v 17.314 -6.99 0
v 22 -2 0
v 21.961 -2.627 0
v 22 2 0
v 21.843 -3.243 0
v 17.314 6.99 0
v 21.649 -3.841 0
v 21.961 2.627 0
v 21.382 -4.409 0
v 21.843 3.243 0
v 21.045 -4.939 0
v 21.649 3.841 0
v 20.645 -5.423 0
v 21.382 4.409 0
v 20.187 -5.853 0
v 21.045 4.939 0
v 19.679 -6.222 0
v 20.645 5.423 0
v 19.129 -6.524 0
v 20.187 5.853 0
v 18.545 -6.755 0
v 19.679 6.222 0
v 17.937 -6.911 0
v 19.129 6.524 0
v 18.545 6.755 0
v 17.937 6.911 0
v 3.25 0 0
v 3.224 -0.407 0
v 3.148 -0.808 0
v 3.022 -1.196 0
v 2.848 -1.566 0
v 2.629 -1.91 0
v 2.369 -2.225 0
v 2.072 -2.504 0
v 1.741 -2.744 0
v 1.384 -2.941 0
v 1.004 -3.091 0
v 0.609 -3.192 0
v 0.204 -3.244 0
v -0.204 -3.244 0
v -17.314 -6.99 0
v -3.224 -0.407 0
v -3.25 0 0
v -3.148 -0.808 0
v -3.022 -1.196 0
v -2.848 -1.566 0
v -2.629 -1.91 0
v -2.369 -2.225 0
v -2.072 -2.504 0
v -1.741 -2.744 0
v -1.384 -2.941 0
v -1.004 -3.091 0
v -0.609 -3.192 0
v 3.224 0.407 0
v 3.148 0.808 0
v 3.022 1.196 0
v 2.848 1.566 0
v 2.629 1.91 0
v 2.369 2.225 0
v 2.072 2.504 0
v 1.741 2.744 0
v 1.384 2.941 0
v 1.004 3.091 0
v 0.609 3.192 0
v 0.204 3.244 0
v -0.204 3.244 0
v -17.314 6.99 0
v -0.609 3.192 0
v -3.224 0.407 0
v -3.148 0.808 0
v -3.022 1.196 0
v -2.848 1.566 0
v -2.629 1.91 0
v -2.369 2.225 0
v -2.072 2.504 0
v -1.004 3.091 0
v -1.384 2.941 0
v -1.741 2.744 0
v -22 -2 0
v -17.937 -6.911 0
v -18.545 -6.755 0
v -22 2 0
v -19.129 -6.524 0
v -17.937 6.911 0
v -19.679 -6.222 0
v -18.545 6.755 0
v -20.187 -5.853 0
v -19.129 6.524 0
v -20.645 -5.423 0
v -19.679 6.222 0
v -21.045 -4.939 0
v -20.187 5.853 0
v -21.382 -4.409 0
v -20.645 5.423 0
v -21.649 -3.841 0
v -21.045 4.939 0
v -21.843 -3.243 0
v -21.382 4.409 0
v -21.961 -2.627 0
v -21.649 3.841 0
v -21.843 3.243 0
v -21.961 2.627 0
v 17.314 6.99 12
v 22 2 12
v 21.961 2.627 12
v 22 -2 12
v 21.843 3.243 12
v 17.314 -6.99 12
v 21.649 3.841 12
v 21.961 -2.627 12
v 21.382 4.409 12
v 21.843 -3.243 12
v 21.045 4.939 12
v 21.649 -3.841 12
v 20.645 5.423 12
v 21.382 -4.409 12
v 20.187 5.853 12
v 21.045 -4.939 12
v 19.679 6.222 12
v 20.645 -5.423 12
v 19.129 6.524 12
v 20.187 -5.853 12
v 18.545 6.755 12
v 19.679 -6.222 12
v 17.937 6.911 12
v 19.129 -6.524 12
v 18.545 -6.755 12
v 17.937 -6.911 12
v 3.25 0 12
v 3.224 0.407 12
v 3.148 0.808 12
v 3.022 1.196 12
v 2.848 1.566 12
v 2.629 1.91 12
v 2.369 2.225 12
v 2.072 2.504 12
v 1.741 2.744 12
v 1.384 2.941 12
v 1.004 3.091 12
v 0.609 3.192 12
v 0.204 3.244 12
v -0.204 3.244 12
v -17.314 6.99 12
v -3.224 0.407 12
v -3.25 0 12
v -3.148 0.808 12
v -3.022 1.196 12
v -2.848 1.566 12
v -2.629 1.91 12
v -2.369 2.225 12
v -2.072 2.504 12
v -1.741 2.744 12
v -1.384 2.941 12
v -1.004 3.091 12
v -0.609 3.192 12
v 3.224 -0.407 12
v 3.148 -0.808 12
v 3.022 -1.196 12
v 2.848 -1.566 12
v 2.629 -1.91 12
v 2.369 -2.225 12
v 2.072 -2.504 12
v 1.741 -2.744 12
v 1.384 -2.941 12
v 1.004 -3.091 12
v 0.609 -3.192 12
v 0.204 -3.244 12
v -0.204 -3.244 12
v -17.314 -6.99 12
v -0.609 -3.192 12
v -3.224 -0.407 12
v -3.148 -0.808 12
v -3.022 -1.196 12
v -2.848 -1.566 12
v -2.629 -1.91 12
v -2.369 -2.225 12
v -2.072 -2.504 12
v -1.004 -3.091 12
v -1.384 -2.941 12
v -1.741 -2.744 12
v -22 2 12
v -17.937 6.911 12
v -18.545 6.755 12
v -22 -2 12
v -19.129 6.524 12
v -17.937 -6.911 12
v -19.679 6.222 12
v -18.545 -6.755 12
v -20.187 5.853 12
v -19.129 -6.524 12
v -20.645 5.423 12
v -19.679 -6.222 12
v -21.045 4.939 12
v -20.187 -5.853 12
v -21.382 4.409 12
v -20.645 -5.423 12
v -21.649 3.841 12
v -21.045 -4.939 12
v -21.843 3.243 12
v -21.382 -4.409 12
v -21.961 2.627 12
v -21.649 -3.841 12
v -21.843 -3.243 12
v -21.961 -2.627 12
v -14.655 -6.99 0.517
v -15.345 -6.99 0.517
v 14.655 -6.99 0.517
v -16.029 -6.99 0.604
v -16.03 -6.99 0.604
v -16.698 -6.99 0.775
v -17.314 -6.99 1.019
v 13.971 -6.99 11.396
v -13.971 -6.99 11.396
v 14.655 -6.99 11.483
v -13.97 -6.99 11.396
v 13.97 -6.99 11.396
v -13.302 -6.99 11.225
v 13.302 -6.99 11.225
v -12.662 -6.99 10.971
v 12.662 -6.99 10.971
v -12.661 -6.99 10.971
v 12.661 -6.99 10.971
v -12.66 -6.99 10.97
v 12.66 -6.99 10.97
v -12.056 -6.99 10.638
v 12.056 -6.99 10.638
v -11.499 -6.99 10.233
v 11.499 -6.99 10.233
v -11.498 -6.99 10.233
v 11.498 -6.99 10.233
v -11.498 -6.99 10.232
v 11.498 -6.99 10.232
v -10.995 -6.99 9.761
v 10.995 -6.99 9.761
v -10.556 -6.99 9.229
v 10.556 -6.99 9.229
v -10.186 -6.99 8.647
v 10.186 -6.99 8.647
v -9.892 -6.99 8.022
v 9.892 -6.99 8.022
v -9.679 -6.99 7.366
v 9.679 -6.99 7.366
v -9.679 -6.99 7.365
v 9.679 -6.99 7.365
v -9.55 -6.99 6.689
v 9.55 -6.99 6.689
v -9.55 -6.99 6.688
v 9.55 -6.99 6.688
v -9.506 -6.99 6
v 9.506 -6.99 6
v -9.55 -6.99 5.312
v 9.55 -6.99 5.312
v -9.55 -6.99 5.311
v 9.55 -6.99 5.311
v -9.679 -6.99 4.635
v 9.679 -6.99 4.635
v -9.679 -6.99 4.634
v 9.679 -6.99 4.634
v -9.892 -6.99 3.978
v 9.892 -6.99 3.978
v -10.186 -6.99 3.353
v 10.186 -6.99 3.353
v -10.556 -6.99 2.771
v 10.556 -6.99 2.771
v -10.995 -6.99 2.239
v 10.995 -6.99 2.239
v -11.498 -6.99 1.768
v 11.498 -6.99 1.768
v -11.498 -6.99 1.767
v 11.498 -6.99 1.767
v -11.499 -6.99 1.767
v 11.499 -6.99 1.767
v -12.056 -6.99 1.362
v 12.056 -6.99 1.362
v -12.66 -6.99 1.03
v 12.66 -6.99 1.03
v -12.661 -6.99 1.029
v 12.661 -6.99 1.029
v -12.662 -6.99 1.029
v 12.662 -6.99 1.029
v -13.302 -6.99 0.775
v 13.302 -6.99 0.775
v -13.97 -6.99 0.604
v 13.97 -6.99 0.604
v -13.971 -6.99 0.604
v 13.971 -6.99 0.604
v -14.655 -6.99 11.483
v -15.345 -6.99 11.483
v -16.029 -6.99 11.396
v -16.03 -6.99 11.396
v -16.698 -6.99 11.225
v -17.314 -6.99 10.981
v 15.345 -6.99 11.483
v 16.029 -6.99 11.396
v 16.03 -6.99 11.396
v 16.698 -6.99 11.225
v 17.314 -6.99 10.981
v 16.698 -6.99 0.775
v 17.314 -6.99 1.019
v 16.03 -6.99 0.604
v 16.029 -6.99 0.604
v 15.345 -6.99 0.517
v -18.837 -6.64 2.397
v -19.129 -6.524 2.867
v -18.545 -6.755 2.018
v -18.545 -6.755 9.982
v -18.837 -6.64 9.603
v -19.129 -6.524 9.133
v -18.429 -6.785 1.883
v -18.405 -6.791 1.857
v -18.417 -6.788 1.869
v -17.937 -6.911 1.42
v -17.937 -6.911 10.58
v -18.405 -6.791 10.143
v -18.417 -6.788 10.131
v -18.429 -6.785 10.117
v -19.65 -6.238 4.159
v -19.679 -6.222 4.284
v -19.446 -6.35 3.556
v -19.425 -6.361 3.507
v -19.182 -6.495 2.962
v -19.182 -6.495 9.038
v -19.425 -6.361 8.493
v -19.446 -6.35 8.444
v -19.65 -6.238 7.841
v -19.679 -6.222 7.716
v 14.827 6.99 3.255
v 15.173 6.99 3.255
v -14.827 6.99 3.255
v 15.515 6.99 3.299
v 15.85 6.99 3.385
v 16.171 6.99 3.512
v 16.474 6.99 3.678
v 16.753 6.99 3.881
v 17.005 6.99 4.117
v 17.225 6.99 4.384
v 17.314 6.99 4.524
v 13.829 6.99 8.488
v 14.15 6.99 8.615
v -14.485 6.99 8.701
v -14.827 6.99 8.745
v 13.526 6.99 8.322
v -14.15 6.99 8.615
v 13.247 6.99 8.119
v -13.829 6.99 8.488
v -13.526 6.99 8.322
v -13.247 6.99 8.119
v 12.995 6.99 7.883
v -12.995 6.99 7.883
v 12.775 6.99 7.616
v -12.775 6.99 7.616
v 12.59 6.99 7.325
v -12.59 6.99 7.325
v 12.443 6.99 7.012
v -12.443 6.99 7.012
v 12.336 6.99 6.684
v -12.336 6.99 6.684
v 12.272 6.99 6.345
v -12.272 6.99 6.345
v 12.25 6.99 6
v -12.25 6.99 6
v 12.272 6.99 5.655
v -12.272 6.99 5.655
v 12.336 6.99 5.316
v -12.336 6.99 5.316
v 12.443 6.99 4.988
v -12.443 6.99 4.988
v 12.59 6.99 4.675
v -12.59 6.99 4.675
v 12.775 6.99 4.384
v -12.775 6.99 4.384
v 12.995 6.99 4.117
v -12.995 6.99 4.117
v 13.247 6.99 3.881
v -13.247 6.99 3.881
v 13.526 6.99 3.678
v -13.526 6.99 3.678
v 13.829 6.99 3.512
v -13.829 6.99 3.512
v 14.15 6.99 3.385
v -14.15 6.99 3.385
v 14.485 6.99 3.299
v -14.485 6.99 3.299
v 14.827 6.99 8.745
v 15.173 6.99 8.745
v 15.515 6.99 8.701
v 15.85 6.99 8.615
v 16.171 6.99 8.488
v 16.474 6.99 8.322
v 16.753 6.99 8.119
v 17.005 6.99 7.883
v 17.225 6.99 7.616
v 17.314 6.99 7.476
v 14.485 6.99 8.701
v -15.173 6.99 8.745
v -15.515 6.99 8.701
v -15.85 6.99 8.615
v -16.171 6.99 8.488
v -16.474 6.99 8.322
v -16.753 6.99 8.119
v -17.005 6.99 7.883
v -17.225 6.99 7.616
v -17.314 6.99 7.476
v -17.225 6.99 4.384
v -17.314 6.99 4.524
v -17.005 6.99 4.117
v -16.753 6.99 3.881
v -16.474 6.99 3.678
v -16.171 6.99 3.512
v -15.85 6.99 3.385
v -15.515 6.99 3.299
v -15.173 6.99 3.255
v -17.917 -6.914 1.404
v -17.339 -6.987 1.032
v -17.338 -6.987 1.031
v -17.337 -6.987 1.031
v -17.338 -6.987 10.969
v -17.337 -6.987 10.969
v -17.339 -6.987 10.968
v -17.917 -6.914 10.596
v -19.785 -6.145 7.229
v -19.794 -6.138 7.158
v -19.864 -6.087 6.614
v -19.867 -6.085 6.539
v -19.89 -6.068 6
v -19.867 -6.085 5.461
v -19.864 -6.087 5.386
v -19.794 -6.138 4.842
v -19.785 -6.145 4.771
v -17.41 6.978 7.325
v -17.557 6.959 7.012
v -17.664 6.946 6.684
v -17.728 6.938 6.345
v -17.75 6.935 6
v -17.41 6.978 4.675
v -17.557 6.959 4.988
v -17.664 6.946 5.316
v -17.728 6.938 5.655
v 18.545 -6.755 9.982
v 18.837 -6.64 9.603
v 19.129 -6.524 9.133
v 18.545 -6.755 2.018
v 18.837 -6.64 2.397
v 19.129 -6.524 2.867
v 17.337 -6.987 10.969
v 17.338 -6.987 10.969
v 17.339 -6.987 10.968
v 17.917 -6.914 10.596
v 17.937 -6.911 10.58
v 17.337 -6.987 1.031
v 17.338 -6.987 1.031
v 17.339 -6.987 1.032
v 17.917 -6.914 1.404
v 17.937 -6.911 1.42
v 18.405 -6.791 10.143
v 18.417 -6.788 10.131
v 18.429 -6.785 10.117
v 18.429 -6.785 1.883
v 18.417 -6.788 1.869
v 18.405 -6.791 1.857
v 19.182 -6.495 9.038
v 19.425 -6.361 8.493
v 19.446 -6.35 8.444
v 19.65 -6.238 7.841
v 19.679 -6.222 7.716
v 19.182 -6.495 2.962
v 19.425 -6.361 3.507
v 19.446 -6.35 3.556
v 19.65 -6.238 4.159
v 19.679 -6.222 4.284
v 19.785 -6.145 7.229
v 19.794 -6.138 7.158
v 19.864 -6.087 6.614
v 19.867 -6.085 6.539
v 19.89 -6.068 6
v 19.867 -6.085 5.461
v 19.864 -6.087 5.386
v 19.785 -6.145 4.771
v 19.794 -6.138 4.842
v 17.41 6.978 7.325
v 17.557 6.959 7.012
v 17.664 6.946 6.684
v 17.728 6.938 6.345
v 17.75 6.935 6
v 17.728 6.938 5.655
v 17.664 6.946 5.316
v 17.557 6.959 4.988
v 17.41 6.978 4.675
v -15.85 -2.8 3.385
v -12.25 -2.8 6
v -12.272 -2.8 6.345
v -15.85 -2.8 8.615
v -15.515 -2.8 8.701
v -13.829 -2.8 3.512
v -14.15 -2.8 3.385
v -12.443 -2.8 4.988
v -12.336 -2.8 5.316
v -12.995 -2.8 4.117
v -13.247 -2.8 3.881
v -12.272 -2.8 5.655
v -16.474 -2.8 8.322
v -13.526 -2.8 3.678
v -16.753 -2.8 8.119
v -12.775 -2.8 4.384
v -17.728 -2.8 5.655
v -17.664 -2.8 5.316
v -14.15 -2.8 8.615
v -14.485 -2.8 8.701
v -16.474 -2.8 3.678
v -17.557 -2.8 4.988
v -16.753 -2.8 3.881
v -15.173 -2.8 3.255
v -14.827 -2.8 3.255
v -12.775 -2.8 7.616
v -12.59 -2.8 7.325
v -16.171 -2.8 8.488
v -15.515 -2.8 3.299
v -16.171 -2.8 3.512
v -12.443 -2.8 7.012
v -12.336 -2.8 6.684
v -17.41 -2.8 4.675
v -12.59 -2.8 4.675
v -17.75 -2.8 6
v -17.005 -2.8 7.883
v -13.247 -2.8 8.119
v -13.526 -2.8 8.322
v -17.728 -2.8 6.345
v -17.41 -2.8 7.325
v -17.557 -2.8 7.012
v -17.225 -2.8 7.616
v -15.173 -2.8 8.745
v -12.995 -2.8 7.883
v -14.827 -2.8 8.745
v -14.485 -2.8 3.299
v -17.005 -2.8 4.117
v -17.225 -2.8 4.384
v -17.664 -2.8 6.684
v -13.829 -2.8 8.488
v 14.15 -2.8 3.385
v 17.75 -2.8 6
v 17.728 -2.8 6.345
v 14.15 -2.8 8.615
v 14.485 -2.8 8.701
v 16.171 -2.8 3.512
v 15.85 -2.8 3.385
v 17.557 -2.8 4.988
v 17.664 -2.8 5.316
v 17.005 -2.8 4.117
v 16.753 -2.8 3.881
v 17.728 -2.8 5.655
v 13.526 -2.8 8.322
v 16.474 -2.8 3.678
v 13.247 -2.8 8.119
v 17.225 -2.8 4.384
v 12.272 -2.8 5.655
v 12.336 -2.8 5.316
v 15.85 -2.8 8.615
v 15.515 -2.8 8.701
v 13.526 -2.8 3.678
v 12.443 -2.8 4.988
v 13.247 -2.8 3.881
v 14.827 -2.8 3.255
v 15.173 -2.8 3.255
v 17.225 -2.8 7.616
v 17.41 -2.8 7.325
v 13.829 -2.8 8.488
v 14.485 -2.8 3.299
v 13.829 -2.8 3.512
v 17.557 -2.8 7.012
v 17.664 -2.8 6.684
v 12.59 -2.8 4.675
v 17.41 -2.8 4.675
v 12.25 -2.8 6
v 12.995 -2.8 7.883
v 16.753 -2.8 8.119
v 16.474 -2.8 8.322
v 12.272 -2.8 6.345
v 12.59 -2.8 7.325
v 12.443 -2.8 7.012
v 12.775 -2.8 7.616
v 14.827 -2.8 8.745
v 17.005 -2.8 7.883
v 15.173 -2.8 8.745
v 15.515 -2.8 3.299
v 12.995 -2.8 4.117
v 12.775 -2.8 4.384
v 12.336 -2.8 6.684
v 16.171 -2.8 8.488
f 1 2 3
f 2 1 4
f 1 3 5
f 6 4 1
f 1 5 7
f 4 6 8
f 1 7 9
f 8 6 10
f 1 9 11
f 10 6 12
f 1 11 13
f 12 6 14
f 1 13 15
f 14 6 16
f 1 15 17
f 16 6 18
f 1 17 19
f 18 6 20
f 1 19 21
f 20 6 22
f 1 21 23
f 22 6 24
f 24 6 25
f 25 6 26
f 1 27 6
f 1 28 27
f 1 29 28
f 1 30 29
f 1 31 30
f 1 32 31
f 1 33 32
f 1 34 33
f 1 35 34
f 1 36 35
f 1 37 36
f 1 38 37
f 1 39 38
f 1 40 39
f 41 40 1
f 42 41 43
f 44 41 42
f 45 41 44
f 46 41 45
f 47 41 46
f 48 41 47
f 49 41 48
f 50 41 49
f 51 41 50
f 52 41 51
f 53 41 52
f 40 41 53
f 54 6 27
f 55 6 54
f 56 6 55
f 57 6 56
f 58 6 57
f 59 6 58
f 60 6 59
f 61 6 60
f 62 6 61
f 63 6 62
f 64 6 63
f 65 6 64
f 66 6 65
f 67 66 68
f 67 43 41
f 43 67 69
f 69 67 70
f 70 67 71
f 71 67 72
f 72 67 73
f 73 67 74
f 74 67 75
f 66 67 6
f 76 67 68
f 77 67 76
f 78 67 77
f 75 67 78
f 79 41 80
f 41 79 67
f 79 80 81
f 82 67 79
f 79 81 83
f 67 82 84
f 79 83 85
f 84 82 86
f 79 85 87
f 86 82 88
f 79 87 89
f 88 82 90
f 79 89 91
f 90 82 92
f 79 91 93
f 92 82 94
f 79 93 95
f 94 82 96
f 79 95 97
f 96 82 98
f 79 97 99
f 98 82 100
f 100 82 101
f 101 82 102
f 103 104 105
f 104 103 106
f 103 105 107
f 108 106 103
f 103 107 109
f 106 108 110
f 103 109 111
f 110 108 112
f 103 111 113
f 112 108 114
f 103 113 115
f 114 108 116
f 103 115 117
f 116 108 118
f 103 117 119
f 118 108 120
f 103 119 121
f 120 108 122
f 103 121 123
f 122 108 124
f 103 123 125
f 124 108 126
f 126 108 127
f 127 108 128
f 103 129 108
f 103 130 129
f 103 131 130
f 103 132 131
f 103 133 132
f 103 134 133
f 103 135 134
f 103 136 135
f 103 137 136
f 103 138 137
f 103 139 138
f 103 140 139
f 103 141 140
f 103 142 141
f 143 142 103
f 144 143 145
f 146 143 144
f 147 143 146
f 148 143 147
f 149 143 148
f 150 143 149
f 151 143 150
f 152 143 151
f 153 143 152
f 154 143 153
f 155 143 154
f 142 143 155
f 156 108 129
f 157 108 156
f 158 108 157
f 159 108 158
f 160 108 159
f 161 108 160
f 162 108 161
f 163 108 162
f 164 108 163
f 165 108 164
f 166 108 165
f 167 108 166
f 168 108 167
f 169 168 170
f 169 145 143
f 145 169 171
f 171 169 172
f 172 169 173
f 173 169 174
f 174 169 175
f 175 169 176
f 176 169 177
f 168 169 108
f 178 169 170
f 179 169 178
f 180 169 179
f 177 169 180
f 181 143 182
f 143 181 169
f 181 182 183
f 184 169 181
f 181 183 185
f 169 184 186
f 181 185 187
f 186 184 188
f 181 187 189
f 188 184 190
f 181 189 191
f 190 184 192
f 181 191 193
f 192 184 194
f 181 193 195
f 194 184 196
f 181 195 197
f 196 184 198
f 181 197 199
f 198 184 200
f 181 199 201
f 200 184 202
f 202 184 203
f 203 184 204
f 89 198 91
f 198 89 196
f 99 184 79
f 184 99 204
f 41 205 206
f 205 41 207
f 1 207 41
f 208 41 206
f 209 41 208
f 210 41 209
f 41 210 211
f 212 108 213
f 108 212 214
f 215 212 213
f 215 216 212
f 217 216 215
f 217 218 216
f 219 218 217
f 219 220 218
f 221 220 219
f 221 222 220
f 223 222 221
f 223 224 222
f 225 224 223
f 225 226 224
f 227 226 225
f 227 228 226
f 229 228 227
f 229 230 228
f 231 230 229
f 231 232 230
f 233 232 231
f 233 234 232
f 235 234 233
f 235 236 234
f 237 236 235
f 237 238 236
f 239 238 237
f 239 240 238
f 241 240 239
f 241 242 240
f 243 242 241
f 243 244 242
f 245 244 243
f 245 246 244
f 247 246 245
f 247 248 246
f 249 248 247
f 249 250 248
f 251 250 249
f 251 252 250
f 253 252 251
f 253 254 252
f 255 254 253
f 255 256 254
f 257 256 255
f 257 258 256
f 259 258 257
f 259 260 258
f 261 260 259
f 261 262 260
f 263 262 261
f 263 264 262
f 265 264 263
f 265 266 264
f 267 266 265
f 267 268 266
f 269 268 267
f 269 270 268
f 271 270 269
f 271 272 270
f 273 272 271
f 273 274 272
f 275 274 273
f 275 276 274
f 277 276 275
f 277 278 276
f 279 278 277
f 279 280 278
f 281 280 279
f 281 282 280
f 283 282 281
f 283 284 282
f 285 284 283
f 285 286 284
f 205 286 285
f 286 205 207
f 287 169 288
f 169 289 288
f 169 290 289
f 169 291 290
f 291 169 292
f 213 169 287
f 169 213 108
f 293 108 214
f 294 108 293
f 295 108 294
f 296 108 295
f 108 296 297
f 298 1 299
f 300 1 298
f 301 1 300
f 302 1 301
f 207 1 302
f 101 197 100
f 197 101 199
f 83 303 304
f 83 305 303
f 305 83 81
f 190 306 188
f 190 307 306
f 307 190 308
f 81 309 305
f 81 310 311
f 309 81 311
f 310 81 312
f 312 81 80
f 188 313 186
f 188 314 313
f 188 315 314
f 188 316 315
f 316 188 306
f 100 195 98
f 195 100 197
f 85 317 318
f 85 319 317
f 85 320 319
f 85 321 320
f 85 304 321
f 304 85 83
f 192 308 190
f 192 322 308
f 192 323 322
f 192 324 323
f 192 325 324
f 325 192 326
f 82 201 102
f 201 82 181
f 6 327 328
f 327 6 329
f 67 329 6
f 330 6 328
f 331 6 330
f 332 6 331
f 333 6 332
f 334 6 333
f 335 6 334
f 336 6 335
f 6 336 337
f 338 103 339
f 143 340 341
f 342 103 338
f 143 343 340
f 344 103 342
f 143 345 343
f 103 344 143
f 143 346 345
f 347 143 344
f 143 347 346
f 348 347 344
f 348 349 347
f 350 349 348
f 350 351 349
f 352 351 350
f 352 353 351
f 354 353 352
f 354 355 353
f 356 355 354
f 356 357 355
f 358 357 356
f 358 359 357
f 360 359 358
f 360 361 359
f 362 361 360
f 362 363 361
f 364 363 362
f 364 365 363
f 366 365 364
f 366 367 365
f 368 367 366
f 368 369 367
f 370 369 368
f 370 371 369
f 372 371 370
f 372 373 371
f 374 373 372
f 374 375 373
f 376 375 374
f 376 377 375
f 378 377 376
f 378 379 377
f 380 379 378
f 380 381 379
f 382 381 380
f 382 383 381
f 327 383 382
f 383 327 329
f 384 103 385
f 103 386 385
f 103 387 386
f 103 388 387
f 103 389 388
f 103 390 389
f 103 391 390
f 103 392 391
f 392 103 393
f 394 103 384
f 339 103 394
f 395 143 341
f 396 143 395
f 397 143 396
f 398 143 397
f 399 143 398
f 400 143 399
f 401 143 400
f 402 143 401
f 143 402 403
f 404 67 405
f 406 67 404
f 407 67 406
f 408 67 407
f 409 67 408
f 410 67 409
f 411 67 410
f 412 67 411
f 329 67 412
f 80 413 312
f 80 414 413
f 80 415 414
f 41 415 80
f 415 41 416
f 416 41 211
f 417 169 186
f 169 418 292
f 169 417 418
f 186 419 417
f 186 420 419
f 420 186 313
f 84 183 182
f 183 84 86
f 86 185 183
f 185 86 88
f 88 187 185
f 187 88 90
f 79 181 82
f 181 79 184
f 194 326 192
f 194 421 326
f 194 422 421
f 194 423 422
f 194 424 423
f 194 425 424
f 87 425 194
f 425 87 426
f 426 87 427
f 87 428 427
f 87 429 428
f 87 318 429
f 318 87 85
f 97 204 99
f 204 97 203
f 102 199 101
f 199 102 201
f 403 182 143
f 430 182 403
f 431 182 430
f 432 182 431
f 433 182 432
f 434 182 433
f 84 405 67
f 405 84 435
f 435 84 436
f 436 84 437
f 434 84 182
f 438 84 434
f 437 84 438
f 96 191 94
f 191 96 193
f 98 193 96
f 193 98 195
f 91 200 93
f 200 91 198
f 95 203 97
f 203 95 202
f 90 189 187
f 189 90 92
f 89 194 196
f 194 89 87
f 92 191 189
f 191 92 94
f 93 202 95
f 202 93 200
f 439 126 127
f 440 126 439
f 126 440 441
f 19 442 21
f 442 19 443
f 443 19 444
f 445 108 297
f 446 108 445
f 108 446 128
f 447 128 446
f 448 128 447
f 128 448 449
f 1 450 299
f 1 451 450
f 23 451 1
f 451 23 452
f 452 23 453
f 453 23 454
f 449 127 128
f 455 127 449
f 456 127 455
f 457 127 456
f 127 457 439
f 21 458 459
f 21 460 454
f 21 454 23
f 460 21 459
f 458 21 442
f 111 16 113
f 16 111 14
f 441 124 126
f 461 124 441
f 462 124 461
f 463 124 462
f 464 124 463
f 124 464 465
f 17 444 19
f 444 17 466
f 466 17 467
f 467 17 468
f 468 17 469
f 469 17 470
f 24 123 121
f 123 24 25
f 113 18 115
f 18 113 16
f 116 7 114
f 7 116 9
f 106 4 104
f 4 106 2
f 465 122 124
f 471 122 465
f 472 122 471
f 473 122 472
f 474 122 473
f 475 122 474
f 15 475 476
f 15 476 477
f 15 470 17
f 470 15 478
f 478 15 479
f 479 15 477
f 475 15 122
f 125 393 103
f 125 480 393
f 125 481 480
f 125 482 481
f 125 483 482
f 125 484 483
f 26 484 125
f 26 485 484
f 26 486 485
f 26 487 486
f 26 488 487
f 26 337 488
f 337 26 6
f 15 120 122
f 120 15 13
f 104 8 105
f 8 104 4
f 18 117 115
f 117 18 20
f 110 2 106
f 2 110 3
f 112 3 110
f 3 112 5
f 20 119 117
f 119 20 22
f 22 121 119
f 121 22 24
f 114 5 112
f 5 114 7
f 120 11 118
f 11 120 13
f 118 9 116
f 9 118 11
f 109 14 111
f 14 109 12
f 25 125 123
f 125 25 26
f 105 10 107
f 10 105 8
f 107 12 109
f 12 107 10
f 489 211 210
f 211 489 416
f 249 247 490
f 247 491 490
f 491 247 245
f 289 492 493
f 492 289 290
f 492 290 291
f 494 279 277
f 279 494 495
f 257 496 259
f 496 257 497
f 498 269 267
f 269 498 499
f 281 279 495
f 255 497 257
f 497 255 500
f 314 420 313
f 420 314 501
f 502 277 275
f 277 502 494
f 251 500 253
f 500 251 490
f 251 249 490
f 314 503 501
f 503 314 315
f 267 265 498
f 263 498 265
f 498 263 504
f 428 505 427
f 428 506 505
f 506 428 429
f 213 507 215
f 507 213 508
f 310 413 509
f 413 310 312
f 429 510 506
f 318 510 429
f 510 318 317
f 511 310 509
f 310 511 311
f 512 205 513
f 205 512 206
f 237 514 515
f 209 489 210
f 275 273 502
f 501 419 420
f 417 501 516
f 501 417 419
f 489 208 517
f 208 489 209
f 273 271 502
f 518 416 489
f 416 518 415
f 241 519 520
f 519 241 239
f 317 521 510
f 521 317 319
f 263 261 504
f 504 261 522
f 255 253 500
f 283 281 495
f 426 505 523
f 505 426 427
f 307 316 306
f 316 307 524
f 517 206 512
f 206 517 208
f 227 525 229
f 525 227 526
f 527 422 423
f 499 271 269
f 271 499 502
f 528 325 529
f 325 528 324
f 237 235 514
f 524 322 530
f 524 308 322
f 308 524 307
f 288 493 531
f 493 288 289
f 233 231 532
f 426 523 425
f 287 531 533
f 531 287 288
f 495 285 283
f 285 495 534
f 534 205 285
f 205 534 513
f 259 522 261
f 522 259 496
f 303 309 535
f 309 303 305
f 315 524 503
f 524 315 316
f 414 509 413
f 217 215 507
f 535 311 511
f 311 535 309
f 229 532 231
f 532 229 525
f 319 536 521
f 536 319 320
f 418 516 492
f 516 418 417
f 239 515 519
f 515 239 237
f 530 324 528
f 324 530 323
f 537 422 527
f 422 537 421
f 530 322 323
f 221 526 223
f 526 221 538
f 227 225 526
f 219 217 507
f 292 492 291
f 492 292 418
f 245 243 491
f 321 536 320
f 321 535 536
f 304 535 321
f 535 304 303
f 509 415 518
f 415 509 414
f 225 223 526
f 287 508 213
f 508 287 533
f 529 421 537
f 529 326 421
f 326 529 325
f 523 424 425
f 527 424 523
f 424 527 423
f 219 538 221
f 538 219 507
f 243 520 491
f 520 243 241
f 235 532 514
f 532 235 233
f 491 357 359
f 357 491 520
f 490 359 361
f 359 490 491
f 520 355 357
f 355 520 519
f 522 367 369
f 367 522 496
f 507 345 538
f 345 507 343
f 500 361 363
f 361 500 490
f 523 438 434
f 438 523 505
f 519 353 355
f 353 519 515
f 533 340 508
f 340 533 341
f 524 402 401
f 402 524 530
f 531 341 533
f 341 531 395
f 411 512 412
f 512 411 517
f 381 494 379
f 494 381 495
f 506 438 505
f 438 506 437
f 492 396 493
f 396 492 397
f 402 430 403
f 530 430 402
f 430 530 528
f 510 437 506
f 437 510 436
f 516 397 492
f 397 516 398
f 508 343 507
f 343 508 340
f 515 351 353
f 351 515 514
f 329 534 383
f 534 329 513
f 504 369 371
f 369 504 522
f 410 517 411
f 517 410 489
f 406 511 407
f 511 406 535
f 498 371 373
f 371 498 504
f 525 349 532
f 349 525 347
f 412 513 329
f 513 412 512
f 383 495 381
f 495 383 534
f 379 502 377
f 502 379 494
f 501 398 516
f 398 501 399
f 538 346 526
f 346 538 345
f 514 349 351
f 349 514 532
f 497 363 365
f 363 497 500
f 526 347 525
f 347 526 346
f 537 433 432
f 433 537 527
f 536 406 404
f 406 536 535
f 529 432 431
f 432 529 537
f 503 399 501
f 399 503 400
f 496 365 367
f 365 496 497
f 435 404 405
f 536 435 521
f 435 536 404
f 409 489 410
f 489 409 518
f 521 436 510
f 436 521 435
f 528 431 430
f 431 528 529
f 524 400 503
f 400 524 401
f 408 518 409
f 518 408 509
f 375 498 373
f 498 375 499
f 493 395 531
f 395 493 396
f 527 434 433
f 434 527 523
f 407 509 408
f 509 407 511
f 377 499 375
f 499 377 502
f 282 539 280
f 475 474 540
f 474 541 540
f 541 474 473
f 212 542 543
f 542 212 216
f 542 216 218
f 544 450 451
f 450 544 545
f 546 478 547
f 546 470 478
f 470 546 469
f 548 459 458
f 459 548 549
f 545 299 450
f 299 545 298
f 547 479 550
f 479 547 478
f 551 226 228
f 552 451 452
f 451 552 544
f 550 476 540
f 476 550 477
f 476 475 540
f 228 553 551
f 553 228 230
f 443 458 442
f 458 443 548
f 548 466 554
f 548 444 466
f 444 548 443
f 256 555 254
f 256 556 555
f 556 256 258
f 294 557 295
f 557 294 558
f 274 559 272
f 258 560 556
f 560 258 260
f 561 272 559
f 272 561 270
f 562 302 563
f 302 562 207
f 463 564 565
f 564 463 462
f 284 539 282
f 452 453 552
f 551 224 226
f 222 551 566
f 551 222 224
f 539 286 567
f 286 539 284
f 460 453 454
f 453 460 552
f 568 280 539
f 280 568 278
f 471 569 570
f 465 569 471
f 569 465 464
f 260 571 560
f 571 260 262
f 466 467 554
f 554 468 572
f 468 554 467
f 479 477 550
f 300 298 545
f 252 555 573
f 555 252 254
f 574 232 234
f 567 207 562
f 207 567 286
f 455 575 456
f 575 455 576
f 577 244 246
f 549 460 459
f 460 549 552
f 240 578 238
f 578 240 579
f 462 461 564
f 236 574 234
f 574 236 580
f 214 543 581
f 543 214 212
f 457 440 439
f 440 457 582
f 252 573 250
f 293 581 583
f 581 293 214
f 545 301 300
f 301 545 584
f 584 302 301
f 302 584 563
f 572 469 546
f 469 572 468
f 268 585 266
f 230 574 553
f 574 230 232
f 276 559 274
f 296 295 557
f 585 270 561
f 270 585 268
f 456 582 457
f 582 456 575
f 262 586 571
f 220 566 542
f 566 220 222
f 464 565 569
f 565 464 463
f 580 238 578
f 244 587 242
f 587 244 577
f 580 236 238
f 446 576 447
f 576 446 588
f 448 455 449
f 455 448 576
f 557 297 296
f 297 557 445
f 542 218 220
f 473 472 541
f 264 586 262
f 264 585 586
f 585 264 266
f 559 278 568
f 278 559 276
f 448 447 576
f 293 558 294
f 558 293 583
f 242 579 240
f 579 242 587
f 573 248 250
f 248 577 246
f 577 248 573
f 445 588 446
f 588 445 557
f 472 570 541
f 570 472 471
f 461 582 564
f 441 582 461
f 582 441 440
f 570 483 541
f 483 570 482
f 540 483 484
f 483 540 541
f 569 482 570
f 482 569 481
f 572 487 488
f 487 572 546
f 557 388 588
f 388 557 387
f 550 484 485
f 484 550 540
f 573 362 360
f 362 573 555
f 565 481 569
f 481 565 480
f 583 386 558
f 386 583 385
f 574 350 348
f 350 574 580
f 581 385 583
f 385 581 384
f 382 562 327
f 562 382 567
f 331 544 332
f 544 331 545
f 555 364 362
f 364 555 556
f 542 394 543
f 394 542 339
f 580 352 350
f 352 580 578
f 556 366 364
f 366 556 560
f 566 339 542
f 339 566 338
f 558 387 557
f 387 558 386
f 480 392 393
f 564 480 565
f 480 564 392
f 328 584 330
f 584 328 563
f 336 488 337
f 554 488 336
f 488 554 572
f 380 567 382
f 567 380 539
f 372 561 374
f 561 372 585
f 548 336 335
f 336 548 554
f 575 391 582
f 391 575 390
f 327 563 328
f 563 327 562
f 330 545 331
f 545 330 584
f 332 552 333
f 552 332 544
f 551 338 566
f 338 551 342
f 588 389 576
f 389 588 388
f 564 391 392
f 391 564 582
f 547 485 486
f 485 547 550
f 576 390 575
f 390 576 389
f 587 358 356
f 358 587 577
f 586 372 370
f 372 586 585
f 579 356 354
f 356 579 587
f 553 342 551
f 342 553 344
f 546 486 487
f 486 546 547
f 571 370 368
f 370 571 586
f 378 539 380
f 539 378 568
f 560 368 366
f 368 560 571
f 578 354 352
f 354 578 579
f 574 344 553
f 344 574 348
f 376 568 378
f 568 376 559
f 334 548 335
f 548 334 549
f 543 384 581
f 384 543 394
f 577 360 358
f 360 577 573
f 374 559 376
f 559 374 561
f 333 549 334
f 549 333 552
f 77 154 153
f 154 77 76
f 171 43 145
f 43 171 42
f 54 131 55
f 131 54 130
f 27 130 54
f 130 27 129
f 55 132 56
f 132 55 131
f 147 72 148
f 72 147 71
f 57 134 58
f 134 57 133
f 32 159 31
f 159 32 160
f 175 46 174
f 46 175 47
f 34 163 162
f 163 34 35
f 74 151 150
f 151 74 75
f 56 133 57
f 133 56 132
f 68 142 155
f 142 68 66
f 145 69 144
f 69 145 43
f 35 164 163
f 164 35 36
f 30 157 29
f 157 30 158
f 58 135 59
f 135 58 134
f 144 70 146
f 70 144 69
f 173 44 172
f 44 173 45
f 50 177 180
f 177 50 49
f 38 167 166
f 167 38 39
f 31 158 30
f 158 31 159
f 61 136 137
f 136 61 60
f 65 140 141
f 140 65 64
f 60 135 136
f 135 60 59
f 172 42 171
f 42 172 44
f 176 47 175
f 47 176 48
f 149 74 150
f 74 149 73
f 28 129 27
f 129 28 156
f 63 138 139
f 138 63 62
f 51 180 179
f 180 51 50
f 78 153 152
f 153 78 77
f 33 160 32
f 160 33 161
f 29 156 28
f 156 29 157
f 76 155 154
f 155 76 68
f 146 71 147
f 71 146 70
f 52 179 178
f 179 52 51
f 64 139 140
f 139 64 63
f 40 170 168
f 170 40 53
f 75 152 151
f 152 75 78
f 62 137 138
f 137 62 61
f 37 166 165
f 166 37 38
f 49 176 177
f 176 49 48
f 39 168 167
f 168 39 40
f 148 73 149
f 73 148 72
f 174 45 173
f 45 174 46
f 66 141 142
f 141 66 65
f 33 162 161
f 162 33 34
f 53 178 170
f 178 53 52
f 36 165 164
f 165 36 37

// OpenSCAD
$fn = 50;


difference() {
	union() {
		cylinder(h = 12, r = 7.0000000000);
		translate(v = [-7.5000000000, 0.0000000000, 0]) {
			hull() {
				translate(v = [-9.5000000000, 2.0000000000, 0]) {
					cylinder(h = 12, r = 5);
				}
				translate(v = [9.5000000000, 2.0000000000, 0]) {
					cylinder(h = 12, r = 5);
				}
				translate(v = [-9.5000000000, -2.0000000000, 0]) {
					cylinder(h = 12, r = 5);
				}
				translate(v = [9.5000000000, -2.0000000000, 0]) {
					cylinder(h = 12, r = 5);
				}
			}
		}
		translate(v = [-7.5000000000, 0.0000000000, 0]) {
			hull() {
				translate(v = [-9.5000000000, 2.0000000000, 0]) {
					cylinder(h = 12, r = 5);
				}
				translate(v = [9.5000000000, 2.0000000000, 0]) {
					cylinder(h = 12, r = 5);
				}
				translate(v = [-9.5000000000, -2.0000000000, 0]) {
					cylinder(h = 12, r = 5);
				}
				translate(v = [9.5000000000, -2.0000000000, 0]) {
					cylinder(h = 12, r = 5);
				}
			}
		}
		translate(v = [7.5000000000, 0.0000000000, 0]) {
			hull() {
				translate(v = [-9.5000000000, 2.0000000000, 0]) {
					cylinder(h = 12, r = 5);
				}
				translate(v = [9.5000000000, 2.0000000000, 0]) {
					cylinder(h = 12, r = 5);
				}
				translate(v = [-9.5000000000, -2.0000000000, 0]) {
					cylinder(h = 12, r = 5);
				}
				translate(v = [9.5000000000, -2.0000000000, 0]) {
					cylinder(h = 12, r = 5);
				}
			}
		}
		translate(v = [7.5000000000, 0.0000000000, 0]) {
			hull() {
				translate(v = [-9.5000000000, 2.0000000000, 0]) {
					cylinder(h = 12, r = 5);
				}
				translate(v = [9.5000000000, 2.0000000000, 0]) {
					cylinder(h = 12, r = 5);
				}
				translate(v = [-9.5000000000, -2.0000000000, 0]) {
					cylinder(h = 12, r = 5);
				}
				translate(v = [9.5000000000, -2.0000000000, 0]) {
					cylinder(h = 12, r = 5);
				}
			}
		}
	}
	union() {
		translate(v = [-15.0000000000, -7.0000000000, 6.0000000000]) {
			rotate(a = [90, 0, 0]) {
				difference() {
					union() {
						#translate(v = [0, 0, -14.0000000000]) {
							cylinder(h = 14, r = 2.2500000000);
						}
						#translate(v = [0, 0, -4.2000000000]) {
							cylinder(h = 4.2000000000, r1 = 2.7500000000, r2 = 5.5000000000);
						}
						#translate(v = [0, 0, -14.0000000000]) {
							cylinder(h = 14, r = 2.7500000000);
						}
						#translate(v = [0, 0, -14.0000000000]) {
							cylinder(h = 14, r = 2.2500000000);
						}
					}
					union();
				}
			}
		}
		translate(v = [15.0000000000, -7.0000000000, 6.0000000000]) {
			rotate(a = [90, 0, 0]) {
				difference() {
					union() {
						#translate(v = [0, 0, -14.0000000000]) {
							cylinder(h = 14, r = 2.2500000000);
						}
						#translate(v = [0, 0, -4.2000000000]) {
							cylinder(h = 4.2000000000, r1 = 2.7500000000, r2 = 5.5000000000);
						}
						#translate(v = [0, 0, -14.0000000000]) {
							cylinder(h = 14, r = 2.7500000000);
						}
						#translate(v = [0, 0, -14.0000000000]) {
							cylinder(h = 14, r = 2.2500000000);
						}
					}
					union();
				}
			}
		}
		translate(v = [0, 0, -100]) {
			cylinder(h = 200, r = 3.2500000000);
		}
		translate(v = [0, 0, -100]) {
			cylinder(h = 200, r = 1.8000000000);
		}
	}
}
